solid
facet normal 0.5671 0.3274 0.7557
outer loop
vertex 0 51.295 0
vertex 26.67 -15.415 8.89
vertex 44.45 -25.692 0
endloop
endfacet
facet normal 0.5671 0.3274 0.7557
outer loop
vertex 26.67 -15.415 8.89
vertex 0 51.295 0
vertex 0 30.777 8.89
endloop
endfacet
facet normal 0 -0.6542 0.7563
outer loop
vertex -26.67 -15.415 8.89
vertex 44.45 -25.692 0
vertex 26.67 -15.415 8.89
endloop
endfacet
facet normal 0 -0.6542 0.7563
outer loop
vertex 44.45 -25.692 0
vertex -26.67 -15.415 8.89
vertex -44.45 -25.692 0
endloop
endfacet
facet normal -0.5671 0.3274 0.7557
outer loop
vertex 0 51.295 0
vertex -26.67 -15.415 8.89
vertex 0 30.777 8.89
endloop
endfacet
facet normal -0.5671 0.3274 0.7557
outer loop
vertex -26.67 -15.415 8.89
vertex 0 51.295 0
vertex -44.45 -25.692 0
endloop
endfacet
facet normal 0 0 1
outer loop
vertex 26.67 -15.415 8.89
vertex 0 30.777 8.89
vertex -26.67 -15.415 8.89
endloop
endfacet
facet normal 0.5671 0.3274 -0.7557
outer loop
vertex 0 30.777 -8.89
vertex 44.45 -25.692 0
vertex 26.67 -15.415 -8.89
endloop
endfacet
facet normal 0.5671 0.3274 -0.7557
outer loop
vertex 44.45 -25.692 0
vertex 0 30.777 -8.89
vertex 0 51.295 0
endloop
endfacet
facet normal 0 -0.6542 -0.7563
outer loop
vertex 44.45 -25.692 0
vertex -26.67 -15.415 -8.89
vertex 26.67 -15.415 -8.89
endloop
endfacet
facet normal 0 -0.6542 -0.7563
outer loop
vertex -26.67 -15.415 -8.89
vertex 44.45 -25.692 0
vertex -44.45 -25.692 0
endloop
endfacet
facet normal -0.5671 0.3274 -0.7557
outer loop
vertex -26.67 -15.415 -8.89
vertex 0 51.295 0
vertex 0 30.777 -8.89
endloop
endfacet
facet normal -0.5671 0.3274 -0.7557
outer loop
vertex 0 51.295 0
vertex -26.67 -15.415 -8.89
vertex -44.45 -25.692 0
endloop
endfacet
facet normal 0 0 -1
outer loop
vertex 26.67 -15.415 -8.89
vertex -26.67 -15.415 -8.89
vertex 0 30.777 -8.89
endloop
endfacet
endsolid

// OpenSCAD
//Enter in inches long each side is
side = 3.5;

//Enter in inches how high it is
height = 0.7;

//Leave the back flat?
flat_back = 0; // [1:Leave Back Flat, 0:No! Both Sides]

s = side*25.4;
h = height*25.4*5;

module triangle()
{
scale([s,s,h]){
difference(){
translate([-0.5, -0.289, 0])
polyhedron(
	points=[[0,0,0],[1,0,0],[0.5,0.866,0],[0.5,0.289,0.25]],
	faces =[[0,1,2],[1,0,3],[2,1,3],[0,2,3]]
);
translate([-1.5,-1.5,0.1])cube(3);
}
}}

union()
{
triangle();
if (flat_back == 0)
{
mirror([0,0,1]){
triangle();
}
}
}
